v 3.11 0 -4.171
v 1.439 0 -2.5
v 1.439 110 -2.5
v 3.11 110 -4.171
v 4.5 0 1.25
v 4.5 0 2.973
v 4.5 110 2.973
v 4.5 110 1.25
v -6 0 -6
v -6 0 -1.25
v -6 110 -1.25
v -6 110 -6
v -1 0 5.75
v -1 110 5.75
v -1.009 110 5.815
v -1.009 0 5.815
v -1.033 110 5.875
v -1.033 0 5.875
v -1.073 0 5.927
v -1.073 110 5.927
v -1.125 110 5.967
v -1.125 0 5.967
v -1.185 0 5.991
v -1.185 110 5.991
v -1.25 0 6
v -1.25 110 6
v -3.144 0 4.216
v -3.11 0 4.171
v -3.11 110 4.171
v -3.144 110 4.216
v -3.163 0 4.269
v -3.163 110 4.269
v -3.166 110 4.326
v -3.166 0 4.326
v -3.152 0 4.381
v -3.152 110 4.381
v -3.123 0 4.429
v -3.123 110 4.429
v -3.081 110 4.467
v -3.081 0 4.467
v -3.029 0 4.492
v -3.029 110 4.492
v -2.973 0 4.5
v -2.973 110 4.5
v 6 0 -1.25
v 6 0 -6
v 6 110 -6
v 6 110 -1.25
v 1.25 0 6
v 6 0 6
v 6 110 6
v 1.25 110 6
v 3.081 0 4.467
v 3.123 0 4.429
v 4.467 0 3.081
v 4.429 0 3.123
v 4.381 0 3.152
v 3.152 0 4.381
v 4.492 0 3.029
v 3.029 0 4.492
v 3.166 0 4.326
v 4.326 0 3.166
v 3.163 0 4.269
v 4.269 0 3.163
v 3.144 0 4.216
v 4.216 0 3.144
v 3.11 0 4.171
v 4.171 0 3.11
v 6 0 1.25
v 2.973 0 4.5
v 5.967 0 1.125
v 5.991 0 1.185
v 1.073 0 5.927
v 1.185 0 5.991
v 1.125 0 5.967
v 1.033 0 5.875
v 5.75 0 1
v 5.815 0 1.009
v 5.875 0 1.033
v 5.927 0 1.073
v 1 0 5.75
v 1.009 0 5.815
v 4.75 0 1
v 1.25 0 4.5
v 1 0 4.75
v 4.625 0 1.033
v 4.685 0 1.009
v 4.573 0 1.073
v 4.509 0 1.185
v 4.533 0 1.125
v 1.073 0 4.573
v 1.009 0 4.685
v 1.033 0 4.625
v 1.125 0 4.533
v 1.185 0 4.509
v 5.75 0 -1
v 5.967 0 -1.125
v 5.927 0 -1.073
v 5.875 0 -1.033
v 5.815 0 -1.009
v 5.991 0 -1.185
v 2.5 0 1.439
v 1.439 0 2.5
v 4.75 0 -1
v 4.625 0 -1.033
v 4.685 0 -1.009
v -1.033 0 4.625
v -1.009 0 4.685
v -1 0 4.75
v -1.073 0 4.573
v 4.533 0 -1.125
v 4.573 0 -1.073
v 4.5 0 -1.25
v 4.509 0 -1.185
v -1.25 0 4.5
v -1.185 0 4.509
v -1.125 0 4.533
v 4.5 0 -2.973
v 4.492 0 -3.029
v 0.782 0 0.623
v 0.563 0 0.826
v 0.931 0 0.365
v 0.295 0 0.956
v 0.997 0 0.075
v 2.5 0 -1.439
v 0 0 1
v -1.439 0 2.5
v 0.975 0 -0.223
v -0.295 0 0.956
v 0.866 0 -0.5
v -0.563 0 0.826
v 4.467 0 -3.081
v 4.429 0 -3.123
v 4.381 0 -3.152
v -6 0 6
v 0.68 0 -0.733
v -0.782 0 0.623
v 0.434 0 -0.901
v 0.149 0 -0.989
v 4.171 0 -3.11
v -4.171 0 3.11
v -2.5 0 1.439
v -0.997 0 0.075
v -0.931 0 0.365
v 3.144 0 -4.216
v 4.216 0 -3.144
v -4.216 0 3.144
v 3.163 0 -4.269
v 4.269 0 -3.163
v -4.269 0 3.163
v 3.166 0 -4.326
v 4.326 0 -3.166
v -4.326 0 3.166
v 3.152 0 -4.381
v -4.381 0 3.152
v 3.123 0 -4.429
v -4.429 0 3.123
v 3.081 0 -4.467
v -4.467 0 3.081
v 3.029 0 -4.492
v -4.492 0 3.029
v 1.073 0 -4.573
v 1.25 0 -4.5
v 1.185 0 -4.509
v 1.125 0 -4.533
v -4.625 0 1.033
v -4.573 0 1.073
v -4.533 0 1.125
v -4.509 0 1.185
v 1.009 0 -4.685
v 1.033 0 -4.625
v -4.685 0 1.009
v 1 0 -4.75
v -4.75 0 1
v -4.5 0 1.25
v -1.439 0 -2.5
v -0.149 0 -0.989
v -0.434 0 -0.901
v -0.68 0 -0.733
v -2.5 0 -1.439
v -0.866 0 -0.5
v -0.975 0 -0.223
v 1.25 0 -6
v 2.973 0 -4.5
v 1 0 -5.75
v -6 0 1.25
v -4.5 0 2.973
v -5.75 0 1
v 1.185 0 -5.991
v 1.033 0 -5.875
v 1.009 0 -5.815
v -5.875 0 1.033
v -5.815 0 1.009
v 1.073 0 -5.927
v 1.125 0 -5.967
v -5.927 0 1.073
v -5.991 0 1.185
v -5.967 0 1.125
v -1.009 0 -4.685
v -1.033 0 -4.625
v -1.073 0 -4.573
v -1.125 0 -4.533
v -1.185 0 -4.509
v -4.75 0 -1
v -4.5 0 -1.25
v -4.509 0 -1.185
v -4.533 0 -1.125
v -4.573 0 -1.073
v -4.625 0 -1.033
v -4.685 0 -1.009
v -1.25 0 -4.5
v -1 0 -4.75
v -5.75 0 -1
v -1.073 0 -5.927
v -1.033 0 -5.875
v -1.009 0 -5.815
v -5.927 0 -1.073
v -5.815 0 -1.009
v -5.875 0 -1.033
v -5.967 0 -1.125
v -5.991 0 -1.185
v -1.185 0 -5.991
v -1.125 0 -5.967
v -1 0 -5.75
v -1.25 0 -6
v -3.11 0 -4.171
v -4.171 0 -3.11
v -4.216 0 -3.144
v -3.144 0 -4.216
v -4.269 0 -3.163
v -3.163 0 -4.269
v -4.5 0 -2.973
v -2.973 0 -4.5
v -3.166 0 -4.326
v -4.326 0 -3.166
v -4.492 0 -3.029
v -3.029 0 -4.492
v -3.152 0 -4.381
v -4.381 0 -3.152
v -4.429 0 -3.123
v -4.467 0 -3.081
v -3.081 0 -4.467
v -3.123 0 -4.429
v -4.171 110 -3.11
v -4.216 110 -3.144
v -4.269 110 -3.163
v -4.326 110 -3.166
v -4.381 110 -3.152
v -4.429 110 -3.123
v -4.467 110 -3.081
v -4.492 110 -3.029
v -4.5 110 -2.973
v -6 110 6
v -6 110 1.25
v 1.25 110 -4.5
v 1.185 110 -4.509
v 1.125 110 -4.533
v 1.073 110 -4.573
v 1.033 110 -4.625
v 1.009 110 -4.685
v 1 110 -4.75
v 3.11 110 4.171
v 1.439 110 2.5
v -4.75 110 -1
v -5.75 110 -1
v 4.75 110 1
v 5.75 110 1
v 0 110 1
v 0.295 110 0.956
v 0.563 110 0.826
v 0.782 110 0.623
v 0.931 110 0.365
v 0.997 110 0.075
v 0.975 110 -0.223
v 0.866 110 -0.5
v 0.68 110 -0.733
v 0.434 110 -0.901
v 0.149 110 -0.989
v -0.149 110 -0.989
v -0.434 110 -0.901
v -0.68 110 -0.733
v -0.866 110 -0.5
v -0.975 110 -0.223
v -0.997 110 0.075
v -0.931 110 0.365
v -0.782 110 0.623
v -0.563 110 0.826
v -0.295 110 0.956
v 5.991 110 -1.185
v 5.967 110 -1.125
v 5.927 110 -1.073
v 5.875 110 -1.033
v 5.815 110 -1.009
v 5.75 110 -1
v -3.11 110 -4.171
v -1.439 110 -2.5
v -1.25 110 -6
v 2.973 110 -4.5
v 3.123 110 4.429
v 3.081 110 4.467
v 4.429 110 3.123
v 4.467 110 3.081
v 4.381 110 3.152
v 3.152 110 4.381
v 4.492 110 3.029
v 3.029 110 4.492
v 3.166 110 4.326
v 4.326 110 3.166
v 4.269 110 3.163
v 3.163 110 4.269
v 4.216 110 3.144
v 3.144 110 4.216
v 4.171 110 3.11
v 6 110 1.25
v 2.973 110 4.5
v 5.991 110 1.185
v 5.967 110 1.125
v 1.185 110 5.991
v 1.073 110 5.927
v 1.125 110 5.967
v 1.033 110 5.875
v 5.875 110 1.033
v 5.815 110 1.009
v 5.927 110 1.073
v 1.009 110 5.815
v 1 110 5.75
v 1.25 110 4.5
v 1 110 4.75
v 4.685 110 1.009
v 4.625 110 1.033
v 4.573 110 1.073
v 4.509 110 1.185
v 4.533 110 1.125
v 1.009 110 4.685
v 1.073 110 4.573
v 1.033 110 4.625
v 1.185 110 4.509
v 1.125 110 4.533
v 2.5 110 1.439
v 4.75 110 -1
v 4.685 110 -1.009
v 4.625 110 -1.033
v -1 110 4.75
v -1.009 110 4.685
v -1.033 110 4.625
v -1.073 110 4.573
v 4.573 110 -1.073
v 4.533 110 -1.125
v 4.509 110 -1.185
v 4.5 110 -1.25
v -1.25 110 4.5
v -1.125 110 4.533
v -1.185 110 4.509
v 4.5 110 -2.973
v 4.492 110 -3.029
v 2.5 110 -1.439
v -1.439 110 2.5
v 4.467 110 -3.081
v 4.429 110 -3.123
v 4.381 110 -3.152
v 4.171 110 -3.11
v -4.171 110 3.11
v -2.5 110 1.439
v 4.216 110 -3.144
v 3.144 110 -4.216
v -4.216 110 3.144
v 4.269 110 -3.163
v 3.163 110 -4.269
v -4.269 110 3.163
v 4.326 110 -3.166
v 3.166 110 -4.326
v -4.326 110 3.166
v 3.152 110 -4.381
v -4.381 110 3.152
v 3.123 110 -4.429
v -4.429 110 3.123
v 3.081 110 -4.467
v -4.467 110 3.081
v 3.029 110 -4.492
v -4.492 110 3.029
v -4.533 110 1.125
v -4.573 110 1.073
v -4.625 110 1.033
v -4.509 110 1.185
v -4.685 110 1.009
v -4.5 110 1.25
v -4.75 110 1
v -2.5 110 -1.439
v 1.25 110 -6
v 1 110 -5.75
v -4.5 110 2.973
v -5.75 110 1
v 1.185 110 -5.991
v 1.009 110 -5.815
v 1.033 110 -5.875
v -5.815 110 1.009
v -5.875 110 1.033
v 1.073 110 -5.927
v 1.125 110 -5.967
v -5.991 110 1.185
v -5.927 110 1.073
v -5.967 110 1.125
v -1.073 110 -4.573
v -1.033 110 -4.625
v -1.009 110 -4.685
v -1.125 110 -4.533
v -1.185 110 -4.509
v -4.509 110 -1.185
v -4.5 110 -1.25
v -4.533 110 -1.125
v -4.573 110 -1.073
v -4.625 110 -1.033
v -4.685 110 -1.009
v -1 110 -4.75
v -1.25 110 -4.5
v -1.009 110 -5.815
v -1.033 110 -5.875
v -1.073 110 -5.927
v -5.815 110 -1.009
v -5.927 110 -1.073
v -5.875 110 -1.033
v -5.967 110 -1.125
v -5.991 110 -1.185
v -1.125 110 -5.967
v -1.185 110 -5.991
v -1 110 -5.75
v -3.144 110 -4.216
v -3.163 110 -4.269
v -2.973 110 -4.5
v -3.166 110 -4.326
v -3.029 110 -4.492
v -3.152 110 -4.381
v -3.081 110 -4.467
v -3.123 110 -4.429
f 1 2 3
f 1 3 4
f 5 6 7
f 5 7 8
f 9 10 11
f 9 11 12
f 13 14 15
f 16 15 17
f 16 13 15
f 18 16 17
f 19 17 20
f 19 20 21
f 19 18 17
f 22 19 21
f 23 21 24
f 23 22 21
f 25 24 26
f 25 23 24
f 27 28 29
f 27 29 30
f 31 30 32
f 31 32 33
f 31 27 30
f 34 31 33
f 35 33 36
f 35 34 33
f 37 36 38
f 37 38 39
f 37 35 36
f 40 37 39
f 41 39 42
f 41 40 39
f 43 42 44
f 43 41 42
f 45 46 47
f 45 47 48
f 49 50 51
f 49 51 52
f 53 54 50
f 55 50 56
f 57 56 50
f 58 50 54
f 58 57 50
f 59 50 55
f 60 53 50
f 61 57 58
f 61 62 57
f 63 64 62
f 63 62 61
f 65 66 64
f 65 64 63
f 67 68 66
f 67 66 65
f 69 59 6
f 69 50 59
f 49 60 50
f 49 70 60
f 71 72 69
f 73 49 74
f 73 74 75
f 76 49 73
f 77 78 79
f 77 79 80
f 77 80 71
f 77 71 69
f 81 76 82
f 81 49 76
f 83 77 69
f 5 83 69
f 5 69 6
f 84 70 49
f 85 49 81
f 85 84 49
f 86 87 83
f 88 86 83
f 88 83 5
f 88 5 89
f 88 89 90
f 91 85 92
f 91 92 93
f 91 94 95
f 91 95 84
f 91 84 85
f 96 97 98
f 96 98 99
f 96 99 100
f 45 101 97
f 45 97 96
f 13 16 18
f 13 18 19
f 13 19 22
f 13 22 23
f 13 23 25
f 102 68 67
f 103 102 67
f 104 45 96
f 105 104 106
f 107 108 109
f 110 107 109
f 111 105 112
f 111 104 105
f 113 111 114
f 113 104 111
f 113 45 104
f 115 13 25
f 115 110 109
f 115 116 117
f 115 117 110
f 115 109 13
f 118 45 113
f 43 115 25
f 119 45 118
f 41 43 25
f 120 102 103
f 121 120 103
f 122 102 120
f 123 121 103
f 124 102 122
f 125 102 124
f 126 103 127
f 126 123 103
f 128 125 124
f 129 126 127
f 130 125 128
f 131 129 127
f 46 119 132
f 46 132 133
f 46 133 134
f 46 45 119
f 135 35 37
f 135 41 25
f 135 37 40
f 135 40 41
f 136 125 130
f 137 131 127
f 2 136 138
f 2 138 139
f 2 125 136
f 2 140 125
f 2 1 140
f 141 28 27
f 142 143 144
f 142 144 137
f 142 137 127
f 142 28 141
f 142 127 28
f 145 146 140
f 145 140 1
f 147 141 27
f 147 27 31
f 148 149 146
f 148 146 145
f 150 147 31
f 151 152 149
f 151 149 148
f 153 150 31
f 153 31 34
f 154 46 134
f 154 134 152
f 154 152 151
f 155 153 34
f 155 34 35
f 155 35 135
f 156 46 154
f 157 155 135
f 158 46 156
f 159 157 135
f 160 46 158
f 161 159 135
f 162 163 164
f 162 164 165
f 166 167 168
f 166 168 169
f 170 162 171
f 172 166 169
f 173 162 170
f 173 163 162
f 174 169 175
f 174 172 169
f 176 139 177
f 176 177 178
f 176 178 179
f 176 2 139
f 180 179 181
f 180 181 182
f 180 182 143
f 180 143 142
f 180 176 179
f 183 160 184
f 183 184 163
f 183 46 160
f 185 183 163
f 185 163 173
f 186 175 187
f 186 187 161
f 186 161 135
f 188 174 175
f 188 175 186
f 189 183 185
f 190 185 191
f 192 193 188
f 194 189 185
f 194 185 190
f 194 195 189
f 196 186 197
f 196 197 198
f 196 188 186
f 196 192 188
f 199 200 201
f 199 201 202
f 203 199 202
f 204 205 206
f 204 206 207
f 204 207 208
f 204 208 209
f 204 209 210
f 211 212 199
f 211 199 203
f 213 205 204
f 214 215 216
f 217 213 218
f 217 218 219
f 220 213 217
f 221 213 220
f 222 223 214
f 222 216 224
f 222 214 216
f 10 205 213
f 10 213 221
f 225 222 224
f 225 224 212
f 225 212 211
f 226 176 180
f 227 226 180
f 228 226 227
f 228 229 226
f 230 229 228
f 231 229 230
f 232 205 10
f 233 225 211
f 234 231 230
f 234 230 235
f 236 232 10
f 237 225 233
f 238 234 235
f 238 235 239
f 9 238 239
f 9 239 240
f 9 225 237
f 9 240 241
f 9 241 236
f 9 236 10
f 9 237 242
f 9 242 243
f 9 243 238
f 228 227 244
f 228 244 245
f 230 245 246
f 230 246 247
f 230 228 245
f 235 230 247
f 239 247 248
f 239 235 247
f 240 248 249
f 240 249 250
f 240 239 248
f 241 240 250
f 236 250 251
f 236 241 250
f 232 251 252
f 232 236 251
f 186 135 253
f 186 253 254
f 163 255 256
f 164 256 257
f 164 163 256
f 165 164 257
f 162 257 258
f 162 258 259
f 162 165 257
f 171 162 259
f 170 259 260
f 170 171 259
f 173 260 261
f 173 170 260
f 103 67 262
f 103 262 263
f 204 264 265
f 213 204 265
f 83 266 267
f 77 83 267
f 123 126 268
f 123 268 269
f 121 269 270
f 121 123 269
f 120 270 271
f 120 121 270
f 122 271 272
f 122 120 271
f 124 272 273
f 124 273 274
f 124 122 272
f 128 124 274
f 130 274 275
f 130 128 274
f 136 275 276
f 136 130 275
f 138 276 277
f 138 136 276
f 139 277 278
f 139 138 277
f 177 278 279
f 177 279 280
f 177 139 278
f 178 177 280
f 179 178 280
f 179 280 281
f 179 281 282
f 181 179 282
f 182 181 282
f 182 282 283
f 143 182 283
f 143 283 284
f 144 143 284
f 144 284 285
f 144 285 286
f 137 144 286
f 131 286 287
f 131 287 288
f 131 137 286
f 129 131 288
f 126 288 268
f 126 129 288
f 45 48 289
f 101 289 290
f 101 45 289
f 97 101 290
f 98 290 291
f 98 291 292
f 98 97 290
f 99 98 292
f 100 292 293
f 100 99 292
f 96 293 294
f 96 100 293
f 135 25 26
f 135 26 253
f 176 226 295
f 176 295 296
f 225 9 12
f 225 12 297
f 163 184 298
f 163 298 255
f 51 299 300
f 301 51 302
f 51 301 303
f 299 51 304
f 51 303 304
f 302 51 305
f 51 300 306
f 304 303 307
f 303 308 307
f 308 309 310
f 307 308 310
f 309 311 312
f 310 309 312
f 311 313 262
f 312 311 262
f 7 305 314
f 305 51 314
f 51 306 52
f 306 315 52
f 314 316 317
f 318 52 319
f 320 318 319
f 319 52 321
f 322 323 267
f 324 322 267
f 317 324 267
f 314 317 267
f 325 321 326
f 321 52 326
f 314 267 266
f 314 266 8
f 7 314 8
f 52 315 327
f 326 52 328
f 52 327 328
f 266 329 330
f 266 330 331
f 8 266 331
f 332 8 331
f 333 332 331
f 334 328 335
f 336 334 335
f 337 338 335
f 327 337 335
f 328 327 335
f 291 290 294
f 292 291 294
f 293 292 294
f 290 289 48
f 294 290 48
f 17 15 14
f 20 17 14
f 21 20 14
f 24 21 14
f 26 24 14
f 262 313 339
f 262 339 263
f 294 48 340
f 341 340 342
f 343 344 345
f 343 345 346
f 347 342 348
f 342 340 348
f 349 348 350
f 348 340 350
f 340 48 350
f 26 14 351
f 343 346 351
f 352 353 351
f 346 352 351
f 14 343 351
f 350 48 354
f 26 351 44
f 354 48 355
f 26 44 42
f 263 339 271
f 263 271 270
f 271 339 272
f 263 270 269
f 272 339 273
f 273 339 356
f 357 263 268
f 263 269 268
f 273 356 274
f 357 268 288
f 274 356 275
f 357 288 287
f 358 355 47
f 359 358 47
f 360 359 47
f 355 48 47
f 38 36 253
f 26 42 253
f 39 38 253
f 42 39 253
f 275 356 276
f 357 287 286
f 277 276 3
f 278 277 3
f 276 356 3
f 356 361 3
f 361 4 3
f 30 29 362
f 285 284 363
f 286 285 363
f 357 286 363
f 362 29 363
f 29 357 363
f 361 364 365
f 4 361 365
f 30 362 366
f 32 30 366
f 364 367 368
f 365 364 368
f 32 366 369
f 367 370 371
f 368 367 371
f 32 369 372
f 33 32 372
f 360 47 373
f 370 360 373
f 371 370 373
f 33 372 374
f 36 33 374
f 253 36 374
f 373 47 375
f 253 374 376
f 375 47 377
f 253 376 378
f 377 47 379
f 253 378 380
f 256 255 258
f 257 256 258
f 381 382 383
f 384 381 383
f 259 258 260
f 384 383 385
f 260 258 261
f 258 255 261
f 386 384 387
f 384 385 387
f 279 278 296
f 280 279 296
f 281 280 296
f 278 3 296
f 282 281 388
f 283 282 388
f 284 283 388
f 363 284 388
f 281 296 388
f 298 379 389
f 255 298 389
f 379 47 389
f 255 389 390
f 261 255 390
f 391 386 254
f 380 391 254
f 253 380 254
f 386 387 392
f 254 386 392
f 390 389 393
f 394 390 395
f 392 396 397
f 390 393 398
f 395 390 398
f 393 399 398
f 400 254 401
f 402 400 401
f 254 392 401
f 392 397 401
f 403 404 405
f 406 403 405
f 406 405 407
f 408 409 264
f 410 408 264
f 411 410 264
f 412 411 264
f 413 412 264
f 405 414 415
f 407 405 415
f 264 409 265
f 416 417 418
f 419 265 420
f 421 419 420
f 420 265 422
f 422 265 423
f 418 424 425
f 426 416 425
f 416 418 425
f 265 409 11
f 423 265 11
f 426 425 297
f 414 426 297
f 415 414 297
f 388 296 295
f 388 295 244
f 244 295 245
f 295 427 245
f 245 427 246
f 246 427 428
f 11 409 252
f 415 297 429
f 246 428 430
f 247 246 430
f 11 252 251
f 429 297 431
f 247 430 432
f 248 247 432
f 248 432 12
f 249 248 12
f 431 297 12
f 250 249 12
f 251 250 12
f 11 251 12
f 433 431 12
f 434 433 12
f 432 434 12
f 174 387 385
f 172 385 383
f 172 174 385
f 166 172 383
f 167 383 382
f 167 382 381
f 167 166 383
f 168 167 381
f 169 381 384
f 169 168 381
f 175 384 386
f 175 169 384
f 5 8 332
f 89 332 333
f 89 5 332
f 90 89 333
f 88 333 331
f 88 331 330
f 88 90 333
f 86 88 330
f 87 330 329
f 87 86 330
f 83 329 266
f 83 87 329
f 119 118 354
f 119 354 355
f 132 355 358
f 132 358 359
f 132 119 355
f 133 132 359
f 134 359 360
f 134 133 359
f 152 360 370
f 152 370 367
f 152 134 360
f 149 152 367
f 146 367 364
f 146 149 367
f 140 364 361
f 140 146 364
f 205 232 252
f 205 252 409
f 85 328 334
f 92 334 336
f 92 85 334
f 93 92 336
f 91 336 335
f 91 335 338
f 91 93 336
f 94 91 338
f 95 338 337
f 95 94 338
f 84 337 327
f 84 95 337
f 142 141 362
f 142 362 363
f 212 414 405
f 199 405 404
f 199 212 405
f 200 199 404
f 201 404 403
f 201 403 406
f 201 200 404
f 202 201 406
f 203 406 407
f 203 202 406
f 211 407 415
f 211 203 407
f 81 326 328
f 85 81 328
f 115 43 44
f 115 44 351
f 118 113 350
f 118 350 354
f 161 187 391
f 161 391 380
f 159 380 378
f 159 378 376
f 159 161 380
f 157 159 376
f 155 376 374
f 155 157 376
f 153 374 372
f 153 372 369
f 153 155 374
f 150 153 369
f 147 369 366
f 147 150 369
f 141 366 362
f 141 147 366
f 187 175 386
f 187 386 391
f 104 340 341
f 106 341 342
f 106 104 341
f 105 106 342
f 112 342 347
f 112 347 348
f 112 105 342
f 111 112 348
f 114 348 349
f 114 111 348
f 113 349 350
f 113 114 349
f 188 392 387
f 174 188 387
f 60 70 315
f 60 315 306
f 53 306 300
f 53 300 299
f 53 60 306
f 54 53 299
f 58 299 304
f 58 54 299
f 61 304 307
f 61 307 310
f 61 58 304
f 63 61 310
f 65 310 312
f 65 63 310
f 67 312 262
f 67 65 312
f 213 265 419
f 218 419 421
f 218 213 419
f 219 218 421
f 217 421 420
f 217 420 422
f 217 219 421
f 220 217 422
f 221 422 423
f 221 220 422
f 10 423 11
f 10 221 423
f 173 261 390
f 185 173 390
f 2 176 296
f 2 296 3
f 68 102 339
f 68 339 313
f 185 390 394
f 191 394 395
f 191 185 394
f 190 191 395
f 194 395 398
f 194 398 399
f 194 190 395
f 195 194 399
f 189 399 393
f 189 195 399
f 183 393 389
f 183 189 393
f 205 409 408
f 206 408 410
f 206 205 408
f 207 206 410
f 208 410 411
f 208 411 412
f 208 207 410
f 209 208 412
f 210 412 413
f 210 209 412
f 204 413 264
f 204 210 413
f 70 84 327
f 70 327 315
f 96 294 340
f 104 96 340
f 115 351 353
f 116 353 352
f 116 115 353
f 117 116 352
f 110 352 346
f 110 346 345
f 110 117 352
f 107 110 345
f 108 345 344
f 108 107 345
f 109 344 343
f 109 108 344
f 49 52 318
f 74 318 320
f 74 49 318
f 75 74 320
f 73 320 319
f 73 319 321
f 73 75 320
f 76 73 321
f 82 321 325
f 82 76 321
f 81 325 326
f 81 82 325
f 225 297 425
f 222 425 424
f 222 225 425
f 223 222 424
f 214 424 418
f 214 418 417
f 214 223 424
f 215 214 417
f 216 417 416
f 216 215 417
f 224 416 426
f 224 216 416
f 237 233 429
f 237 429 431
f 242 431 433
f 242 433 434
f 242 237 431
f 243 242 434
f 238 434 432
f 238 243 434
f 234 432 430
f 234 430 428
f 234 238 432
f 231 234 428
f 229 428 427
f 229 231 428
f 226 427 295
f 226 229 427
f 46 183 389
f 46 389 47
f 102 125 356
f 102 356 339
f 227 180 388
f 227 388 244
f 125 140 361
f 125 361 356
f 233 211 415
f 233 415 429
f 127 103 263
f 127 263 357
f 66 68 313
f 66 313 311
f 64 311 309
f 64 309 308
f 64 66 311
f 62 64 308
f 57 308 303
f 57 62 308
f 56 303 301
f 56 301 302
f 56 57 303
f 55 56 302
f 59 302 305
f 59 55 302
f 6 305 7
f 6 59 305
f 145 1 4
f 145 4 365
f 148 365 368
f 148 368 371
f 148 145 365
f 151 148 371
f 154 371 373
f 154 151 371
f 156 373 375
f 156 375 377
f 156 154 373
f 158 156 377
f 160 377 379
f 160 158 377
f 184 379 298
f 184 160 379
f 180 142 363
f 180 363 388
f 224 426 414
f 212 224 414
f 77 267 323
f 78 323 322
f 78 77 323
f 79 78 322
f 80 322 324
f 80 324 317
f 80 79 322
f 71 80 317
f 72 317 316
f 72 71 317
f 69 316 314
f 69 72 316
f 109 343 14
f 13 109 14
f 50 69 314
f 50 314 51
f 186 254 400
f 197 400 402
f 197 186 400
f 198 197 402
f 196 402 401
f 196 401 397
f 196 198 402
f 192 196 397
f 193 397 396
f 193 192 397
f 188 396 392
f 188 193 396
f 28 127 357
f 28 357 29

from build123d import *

# Parameters (mm, degrees)
SKETCH1_R           = 1
BOSS_EXTRUDE1_DEPTH = 110


with BuildPart() as part:
    # Sketch1 → Boss-Extrude1 (new body)
    with BuildSketch(Plane(origin=(0, 0, 0), x_dir=(1, 0, 0), z_dir=(0, 1, 0))):
        with BuildLine():
            Line((1.25, 6), (6, 6))
            Line((6, 6), (6, 1.25))
            ThreePointArc((6, 1.25), (5.926776695, 1.073223305), (5.75, 1))
            Line((5.75, 1), (4.75, 1))
            ThreePointArc((4.75, 1), (4.573223305, 1.073223305), (4.5, 1.25))
            Line((4.5, 1.25), (4.5, 2.973453617))
            ThreePointArc((4.5, 2.973453617), (4.380872479, 3.151740551), (4.170568701, 3.109908529))
            Line((4.170568701, 3.109908529), (2.5, 1.439339828))
            Line((2.5, 1.439339828), (2.5, -1.439339828))
            Line((2.5, -1.439339828), (4.170568701, -3.109908529))
            ThreePointArc((4.170568701, -3.109908529), (4.380872479, -3.151740551), (4.5, -2.973453617))
            Line((4.5, -2.973453617), (4.5, -1.25))
            ThreePointArc((4.5, -1.25), (4.573223305, -1.073223305), (4.75, -1))
            Line((4.75, -1), (5.75, -1))
            ThreePointArc((5.75, -1), (5.926776695, -1.073223305), (6, -1.25))
            Line((6, -1.25), (6, -6))
            Line((6, -6), (1.25, -6))
            ThreePointArc((1.25, -6), (1.073223305, -5.926776695), (1, -5.75))
            Line((1, -5.75), (1, -4.75))
            ThreePointArc((1, -4.75), (1.073223305, -4.573223305), (1.25, -4.5))
            Line((1.25, -4.5), (2.973453617, -4.5))
            ThreePointArc((2.973453617, -4.5), (3.151740551, -4.380872479), (3.109908529, -4.170568701))
            Line((3.109908529, -4.170568701), (1.439339828, -2.5))
            Line((1.439339828, -2.5), (-1.439339828, -2.5))
            Line((-1.439339828, -2.5), (-3.109908529, -4.170568701))
            ThreePointArc((-3.109908529, -4.170568701), (-3.151740551, -4.380872479), (-2.973453617, -4.5))
            Line((-2.973453617, -4.5), (-1.25, -4.5))
            ThreePointArc((-1.25, -4.5), (-1.073223305, -4.573223305), (-1, -4.75))
            Line((-1, -4.75), (-1, -5.75))
            ThreePointArc((-1, -5.75), (-1.073223305, -5.926776695), (-1.25, -6))
            Line((-1.25, -6), (-6, -6))
            Line((-6, -6), (-6, -1.25))
            ThreePointArc((-6, -1.25), (-5.926776695, -1.073223305), (-5.75, -1))
            Line((-5.75, -1), (-4.75, -1))
            ThreePointArc((-4.75, -1), (-4.573223305, -1.073223305), (-4.5, -1.25))
            Line((-4.5, -1.25), (-4.5, -2.973453617))
            ThreePointArc((-4.5, -2.973453617), (-4.380872479, -3.151740551), (-4.170568701, -3.109908529))
            Line((-4.170568701, -3.109908529), (-2.5, -1.439339828))
            Line((-2.5, -1.439339828), (-2.5, 1.439339828))
            Line((-2.5, 1.439339828), (-4.170568701, 3.109908529))
            ThreePointArc((-4.170568701, 3.109908529), (-4.380872479, 3.151740551), (-4.5, 2.973453617))
            Line((-4.5, 2.973453617), (-4.5, 1.25))
            ThreePointArc((-4.5, 1.25), (-4.573223305, 1.073223305), (-4.75, 1))
            Line((-4.75, 1), (-5.75, 1))
            ThreePointArc((-5.75, 1), (-5.926776695, 1.073223305), (-6, 1.25))
            Line((-6, 1.25), (-6, 6))
            Line((-6, 6), (-1.25, 6))
            ThreePointArc((-1.25, 6), (-1.073223305, 5.926776695), (-1, 5.75))
            Line((-1, 5.75), (-1, 4.75))
            ThreePointArc((-1, 4.75), (-1.073223305, 4.573223305), (-1.25, 4.5))
            Line((-1.25, 4.5), (-2.973453617, 4.5))
            ThreePointArc((-2.973453617, 4.5), (-3.151740551, 4.380872479), (-3.109908529, 4.170568701))
            Line((-3.109908529, 4.170568701), (-1.439339828, 2.5))
            Line((-1.439339828, 2.5), (1.439339828, 2.5))
            Line((1.439339828, 2.5), (3.109908529, 4.170568701))
            ThreePointArc((3.109908529, 4.170568701), (3.151740551, 4.380872479), (2.973453617, 4.5))
            Line((2.973453617, 4.5), (1.25, 4.5))
            ThreePointArc((1.25, 4.5), (1.073223305, 4.573223305), (1, 4.75))
            Line((1, 4.75), (1, 5.75))
            ThreePointArc((1, 5.75), (1.073223305, 5.926776695), (1.25, 6))
        make_face()
        with Locations(Location((0, 0, 0), (0, 0, 270))):
            Circle(SKETCH1_R, mode=Mode.SUBTRACT)
    extrude(amount=BOSS_EXTRUDE1_DEPTH)


solid = part.part
